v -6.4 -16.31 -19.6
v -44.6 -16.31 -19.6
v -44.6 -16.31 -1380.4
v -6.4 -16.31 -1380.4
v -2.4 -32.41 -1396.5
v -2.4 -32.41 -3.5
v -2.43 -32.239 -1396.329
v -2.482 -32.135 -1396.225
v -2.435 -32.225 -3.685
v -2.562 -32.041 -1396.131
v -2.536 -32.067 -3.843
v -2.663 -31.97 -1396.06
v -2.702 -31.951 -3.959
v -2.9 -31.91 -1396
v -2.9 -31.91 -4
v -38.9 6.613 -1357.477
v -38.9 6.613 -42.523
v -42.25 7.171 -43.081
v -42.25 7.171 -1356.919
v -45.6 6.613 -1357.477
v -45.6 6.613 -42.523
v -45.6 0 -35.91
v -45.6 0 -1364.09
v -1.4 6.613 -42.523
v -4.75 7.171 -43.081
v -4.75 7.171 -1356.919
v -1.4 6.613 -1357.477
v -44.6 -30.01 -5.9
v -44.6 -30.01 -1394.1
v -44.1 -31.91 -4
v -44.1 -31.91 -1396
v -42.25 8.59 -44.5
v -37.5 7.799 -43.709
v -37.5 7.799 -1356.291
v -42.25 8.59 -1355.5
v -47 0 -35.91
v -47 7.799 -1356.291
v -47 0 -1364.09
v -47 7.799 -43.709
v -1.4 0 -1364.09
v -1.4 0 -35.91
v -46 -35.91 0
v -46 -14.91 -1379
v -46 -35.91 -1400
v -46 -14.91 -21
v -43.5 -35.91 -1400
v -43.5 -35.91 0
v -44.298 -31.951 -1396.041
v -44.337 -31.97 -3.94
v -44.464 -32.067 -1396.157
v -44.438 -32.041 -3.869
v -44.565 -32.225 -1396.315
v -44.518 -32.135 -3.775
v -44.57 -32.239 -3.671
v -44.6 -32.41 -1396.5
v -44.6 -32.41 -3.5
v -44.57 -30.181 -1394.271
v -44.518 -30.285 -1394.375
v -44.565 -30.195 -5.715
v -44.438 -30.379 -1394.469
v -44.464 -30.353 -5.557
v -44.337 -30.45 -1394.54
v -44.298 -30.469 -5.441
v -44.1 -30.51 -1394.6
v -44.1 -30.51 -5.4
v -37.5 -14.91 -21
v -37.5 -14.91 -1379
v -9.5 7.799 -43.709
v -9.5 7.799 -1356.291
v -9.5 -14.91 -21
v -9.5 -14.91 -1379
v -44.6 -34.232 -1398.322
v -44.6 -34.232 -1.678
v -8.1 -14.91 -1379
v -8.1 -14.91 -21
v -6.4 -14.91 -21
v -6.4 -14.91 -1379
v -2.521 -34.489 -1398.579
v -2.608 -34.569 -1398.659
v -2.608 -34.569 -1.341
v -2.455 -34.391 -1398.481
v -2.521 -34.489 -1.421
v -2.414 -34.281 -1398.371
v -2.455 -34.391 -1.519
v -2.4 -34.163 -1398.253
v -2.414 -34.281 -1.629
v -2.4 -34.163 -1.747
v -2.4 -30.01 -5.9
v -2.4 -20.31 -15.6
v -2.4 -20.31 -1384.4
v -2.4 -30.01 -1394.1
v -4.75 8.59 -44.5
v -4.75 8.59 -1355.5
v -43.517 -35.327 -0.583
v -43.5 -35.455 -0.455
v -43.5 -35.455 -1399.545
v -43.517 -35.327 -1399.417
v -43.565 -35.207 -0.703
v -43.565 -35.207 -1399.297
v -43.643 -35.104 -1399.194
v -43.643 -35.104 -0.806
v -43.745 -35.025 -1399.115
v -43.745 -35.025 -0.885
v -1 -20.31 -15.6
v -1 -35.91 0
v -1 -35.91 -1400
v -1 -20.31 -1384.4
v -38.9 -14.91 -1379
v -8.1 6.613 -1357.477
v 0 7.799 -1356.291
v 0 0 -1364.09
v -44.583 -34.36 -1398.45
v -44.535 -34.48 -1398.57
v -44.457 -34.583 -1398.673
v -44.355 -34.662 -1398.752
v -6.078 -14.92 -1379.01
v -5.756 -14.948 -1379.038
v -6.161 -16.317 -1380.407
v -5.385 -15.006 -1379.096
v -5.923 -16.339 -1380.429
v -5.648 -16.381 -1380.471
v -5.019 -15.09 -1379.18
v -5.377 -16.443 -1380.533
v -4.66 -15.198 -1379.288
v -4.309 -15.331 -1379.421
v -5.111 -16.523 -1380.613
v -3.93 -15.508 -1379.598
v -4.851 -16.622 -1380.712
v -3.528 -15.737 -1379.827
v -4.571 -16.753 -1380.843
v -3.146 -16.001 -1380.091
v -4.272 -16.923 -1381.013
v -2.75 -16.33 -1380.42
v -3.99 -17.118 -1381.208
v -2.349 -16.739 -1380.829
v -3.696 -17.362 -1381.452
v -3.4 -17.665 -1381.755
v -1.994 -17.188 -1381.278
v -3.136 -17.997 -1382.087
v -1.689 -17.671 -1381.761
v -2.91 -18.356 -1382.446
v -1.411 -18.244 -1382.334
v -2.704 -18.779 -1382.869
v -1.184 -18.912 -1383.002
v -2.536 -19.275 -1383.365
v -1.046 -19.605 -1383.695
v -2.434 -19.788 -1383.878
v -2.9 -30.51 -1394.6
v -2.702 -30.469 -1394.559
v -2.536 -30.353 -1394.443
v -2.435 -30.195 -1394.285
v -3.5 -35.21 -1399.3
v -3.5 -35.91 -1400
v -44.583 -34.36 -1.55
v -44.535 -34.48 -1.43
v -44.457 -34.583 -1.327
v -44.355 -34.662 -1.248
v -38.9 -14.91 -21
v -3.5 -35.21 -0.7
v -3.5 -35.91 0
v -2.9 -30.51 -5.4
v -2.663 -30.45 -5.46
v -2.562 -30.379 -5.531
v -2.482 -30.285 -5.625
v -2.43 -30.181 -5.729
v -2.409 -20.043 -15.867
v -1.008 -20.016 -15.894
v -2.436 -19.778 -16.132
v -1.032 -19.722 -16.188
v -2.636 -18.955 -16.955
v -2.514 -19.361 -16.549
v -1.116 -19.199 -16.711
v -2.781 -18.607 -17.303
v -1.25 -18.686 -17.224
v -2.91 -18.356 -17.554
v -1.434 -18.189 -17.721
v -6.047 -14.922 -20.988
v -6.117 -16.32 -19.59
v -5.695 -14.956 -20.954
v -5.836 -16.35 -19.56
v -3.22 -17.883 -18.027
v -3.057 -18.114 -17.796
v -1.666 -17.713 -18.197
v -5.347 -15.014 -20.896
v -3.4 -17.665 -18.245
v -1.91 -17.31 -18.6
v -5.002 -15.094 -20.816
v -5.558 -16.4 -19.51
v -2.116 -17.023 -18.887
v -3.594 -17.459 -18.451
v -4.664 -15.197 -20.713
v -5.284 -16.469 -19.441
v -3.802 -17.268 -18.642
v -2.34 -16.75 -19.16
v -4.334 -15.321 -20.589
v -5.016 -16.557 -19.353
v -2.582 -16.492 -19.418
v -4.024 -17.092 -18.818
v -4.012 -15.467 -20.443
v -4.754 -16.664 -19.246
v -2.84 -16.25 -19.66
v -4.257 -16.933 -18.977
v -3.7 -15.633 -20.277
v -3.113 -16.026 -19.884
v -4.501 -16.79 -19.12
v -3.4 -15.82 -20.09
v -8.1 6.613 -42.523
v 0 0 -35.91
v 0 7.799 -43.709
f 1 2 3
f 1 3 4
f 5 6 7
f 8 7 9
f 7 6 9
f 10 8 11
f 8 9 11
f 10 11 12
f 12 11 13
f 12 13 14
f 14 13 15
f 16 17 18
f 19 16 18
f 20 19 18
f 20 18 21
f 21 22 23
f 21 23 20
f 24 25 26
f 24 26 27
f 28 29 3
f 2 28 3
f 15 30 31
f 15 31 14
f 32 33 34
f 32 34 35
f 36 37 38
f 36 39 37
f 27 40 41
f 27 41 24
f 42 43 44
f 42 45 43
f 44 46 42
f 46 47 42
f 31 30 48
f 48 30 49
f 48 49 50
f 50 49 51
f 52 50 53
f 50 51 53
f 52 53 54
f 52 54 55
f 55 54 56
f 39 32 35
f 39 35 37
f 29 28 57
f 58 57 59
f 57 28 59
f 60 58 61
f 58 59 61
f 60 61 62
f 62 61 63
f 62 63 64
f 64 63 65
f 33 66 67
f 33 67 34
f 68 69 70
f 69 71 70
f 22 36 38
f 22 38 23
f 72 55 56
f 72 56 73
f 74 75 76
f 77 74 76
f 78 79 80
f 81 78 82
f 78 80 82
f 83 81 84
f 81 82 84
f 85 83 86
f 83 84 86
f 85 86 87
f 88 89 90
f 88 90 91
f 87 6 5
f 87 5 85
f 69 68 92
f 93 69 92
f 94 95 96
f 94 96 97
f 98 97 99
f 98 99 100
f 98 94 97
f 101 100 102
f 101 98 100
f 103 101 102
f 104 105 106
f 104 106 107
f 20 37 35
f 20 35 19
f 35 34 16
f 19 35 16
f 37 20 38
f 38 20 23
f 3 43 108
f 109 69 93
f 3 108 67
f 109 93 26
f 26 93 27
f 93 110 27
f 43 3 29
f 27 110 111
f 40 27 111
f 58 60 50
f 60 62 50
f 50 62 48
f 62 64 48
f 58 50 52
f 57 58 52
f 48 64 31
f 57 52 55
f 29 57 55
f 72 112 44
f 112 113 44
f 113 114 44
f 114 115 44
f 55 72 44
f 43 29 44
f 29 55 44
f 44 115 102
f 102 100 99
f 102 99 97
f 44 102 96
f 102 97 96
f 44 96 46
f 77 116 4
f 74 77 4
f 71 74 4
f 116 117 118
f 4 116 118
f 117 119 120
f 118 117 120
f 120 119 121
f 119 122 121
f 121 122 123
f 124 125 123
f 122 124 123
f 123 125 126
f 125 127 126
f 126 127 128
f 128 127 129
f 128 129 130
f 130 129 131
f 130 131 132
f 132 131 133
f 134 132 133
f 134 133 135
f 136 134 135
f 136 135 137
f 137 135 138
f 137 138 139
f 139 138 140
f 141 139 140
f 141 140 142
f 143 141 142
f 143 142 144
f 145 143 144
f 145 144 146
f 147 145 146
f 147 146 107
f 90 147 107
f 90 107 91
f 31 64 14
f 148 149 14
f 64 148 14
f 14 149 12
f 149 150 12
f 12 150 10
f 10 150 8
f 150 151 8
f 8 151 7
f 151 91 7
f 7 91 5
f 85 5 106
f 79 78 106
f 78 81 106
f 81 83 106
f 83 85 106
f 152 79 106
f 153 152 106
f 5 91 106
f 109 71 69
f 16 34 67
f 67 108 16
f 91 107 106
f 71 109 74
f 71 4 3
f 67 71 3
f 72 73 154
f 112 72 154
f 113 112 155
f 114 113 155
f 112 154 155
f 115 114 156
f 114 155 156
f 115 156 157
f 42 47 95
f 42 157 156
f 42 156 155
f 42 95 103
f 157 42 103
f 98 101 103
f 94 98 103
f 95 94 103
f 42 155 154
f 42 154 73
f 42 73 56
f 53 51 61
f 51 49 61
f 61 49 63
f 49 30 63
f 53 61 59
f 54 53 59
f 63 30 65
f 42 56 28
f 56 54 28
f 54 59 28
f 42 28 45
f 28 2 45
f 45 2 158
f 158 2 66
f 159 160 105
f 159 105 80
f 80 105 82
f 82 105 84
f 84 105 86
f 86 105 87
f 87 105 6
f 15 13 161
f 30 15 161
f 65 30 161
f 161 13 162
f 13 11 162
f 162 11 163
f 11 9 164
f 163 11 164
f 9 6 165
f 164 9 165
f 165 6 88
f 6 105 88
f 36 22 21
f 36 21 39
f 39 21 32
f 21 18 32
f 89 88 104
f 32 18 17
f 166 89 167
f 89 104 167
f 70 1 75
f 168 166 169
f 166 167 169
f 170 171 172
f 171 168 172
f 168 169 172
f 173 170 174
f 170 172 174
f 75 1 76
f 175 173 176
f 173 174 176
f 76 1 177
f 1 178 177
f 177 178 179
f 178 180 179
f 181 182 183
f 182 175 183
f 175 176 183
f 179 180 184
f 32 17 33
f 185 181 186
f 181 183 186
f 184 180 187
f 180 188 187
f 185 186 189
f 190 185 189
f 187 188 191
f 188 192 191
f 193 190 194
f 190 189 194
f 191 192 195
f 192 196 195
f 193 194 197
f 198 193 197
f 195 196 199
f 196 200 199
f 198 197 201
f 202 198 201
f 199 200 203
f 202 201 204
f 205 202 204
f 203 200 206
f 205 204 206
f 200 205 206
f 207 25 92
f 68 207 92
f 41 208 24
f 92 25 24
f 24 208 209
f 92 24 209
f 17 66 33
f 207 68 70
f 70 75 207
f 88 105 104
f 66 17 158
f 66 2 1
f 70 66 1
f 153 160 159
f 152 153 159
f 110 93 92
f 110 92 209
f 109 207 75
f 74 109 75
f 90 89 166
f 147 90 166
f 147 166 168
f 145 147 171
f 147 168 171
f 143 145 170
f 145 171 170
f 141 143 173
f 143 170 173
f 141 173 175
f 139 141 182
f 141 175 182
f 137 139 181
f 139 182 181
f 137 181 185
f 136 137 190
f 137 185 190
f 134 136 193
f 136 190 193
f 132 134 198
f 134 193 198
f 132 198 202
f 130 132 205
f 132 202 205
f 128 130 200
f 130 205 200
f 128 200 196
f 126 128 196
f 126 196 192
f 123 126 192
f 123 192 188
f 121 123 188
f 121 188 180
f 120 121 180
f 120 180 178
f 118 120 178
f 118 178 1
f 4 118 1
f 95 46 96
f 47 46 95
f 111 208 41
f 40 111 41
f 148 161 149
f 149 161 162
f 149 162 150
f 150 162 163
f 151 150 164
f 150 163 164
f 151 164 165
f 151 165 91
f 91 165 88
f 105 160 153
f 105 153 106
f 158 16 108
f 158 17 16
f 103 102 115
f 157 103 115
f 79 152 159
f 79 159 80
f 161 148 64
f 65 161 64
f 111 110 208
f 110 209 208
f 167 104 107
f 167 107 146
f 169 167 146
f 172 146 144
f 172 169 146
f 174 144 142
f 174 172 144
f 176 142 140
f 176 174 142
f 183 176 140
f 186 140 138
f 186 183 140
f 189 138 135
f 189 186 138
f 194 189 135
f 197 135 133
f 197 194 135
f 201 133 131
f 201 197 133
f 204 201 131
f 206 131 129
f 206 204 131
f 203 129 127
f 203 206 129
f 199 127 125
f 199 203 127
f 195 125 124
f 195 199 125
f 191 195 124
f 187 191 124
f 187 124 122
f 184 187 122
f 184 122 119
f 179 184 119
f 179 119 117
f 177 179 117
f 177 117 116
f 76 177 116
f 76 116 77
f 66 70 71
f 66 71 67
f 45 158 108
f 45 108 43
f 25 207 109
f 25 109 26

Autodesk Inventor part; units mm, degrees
ref_plane "YZ Plane" through (0, 0, 0) normal (1, 0, 0) x (0, 1, 0)
ref_plane "XZ Plane" through (0, 0, 0) normal (0, 1, 0) x (-1, 0, 0)
ref_plane "XY Plane" through (0, 0, 0) normal (0, 0, 1) x (1, 0, 0)
sketch "Boceto1" plane through (0, 0, 0) normal (0, 0, 1) x (1, 0, 0)
  line L0 (-46, -14.91) -> (-46, -35.91)
  line L1 (-44.1, -31.91) -> (-2.9, -31.91)
  line L2 (-1, -35.91) -> (-1, -20.31)
  line L3 (-8.1, 6.6131) -> (-8.1, -14.91)
  line L4 (-44.6, -16.31) -> (-6.4, -16.31)
  line L5 (-2.4, -20.31) -> (-2.4, -30.01)
  line L6 (-2.9, -30.51) -> (-44.1, -30.51)
  line L7 (-44.6, -30.01) -> (-44.6, -16.31)
  arc A0 (-2.4, -20.31) -> (-6.4, -16.31) centre (-6.4, -20.31) ccw
  line L8 (-2.4, -32.41) -> (-2.4, -34.1632)
  line L9 (-3.5, -35.91) -> (-1, -35.91)
  line L10 (-9.5, -14.91) -> (-9.5, 7.7994)
  line L11 (-44.6, -32.41) -> (-44.6, -34.2323)
  line L12 (-43.5, -35.91) -> (-46, -35.91)
  line L13 (-43.5, -35.91) -> (-43.5, -35.4546)
  line L14 (-3.5, -35.91) -> (-3.5, -35.21)
  line L15 (-43.7447, -35.0247) -> (-44.3553, -34.6622)
  line L16 (-3.5, -35.21) -> (-2.6082, -34.5692)
  arc A1 (-2.9, -30.51) -> (-2.4, -30.01) centre (-2.9, -30.01) ccw
  arc A2 (-2.4, -32.41) -> (-2.9, -31.91) centre (-2.9, -32.41) ccw
  arc A3 (-2.6082, -34.5692) -> (-2.4, -34.1632) centre (-2.9, -34.1632) ccw
  arc A4 (-44.6, -30.01) -> (-44.1, -30.51) centre (-44.1, -30.01) ccw
  arc A5 (-44.1, -31.91) -> (-44.6, -32.41) centre (-44.1, -32.41) ccw
  arc A6 (-44.6, -34.2323) -> (-44.3553, -34.6622) centre (-44.1, -34.2323) ccw
  arc A7 (-43.5, -35.4546) -> (-43.7447, -35.0247) centre (-44, -35.4546) ccw
  line L17 (-9.5, 7.7994) -> (-4.75, 8.59)
  line L18 (-4.75, 8.59) -> (0, 7.7994)
  line L19 (-8.1, 6.6131) -> (-4.75, 7.1707)
  line L20 (-4.75, 7.1707) -> (-1.4, 6.6131)
  line L21 (0, 7.7994) -> (0, 0)
  line L22 (0, 0) -> (-1.4, 0)
  line L23 (-1.4, 0) -> (-1.4, 6.6131)
  line L24 (-8.1, -14.91) -> (-6.4, -14.91)
  arc A8 (-1, -20.31) -> (-6.4, -14.91) centre (-6.4, -20.31) ccw
  line L25 (-4.75, 16.5254) -> (-4.75, 0) construction
  line L26 (-38.9, 6.6131) -> (-38.9, -14.91)
  line L27 (-37.5, -14.91) -> (-37.5, 7.7994)
  line L28 (-37.5, 7.7994) -> (-42.25, 8.59)
  line L29 (-42.25, 8.59) -> (-47, 7.7994)
  line L30 (-38.9, 6.6131) -> (-42.25, 7.1707)
  line L31 (-42.25, 7.1707) -> (-45.6, 6.6131)
  line L32 (-47, 7.7994) -> (-47, 0)
  line L33 (-47, 0) -> (-45.6, 0)
  line L34 (-45.6, 0) -> (-45.6, 6.6131)
  line L35 (-42.25, 16.5254) -> (-42.25, 0) construction
  line L36 (-9.5, -14.91) -> (-37.5, -14.91)
  line L37 (-38.9, -14.91) -> (-46, -14.91)
  line L38 (-23.5, 14.1873) -> (-23.5, -36.7854) construction
  point P0 (-44.6, -34.5169)
  point P1 (-43.5, -35.17)
  dimension "d17" = 4
  dimension "d24" = 1.4
  dimension "d50" = 0.7
  dimension "d61" = 0.74
  dimension "d62" = 30.7
  dimension "d63" = 35.7
  dimension "d206" = 1.4
  dimension "d207" = 1.4
  dimension "d210" = 1.4
  dimension "d211" = 1.4
  dimension "d213" = 14.2
  dimension "d214" = 1.4
  dimension "d215" = 1.4
  dimension "d216" = 1.4
  dimension "d217" = 1.4
  dimension "d218" = 45
  dimension "d223" = 5.4
  dimension "d224" = 1.4
  dimension "d225" = 9.5
  dimension "d226" = 4.75
  dimension "d227" = 3.35
  dimension "d228" = 6.7
  dimension "d229" = 44.5
  dimension "d230" = 3.35
  dimension "d231" = 2.5
  dimension "d232" = 2.5
  dimension "d240" = 8.59
  dimension "d241" = 3.35
  dimension "d242" = 99.45
  dimension "d243" = 161.1
  dimension "d246" = 1.4
  dimension "d247" = 1.4
  dimension "d248" = 1.4
  dimension "d253" = 1.4
  dimension "d254" = 1.4
  dimension "d255" = 1.4
  dimension "d256" = 1.4
  dimension "d257" = 8.59
  dimension "d258" = 161.1
  dimension "d259" = 99.45
  dimension "d260" = 22.5
  dimension "d266" = 23.5
  dimension "d267" = 47
  dimension "d268" = 3.35
  dimension "d269" = 9.5
  dimension "d270" = 4.75
  dimension "d271" = 3.35
  dimension "d272" = 6.7
  dimension "d273" = 28
  dimension "d274" = 37.5
  dimension "d275" = 8.5
  dimension "d276" = 8.5
  dimension "d277" = 44.5
  dimension "d278" = 0.5
  dimension "d279" = 14.91
  dimension "d280" = 14.91
  dimension "d283" = 16.5254
  dimension "d284" = 0
  dimension "d285" = 14.1873
  dimension "d286" = 36.7854
  dimension "d287" = 16.5254
  dimension "d288" = 0
extrude "Extrusión1" add sketch "Boceto1" against normal blind 1400
ref_plane "Plano de trabajo1" through (0, 0, -700) normal (0, 0, -1) x (-1, 0, 0)
sketch "Boceto2" plane through (0, 0, 0) normal (1, 0, 0) x (0, 1, 0)
  line L0 (-35.91, 0) -> (-20.31, 0) projected
  line L1 (-35.91, 0) -> (-35.91, -1400) projected
  line L2 (-20.31, -1400) -> (-35.91, -1400) projected
  line L3 (-20.31, 0) -> (-20.31, -1400) projected
  line L4 (-20.31, 0) -> (-14.91, 0) projected
  line L5 (-20.31, 0) -> (-20.31, -1400) projected
  line L6 (-14.91, -1400) -> (-20.31, -1400) projected
  line L7 (-14.91, 0) -> (-14.91, -1400) projected
  line L8 (-14.91, 0) -> (6.6131, 0) projected
  line L9 (-14.91, 0) -> (-14.91, -1400) projected
  line L10 (6.6131, -1400) -> (-14.91, -1400) projected
  line L11 (6.6131, 0) -> (6.6131, -1400) projected
  line L12 (0, 0) -> (7.7994, 0) projected
  line L13 (0, 0) -> (0, -1400) projected
  line L14 (7.7994, -1400) -> (0, -1400) projected
  line L15 (7.7994, 0) -> (7.7994, -1400) projected
  line L16 (7.7994, 0) -> (8.59, 0) projected
  line L17 (7.7994, 0) -> (7.7994, -1400) projected
  line L18 (8.59, -1400) -> (7.7994, -1400) projected
  line L19 (8.59, 0) -> (8.59, -1400) projected
  line L20 (-35.91, 0) -> (8.59, -44.5)
  line L21 (8.59, 0) -> (8.59, -44.5)
  line L22 (8.59, 0) -> (-35.91, 0)
  dimension "d291" = 45
extrude "Extrusión2" cut sketch "Boceto2" against normal through all contours L0 L3 L20 | L4 L7 L20 L3 | L8 L13 L20 L7 | L8 L11 L20 L13 | L12 L15 L20 L11 | L16 L19 L20 L15
mirror "Simetría1" about plane through (0, 0, -700) normal (0, 0, -1) of "Extrusión2"
properties part number "SP40-09 MARCO CORREDERA 1400 MM" material "Aluminio"
